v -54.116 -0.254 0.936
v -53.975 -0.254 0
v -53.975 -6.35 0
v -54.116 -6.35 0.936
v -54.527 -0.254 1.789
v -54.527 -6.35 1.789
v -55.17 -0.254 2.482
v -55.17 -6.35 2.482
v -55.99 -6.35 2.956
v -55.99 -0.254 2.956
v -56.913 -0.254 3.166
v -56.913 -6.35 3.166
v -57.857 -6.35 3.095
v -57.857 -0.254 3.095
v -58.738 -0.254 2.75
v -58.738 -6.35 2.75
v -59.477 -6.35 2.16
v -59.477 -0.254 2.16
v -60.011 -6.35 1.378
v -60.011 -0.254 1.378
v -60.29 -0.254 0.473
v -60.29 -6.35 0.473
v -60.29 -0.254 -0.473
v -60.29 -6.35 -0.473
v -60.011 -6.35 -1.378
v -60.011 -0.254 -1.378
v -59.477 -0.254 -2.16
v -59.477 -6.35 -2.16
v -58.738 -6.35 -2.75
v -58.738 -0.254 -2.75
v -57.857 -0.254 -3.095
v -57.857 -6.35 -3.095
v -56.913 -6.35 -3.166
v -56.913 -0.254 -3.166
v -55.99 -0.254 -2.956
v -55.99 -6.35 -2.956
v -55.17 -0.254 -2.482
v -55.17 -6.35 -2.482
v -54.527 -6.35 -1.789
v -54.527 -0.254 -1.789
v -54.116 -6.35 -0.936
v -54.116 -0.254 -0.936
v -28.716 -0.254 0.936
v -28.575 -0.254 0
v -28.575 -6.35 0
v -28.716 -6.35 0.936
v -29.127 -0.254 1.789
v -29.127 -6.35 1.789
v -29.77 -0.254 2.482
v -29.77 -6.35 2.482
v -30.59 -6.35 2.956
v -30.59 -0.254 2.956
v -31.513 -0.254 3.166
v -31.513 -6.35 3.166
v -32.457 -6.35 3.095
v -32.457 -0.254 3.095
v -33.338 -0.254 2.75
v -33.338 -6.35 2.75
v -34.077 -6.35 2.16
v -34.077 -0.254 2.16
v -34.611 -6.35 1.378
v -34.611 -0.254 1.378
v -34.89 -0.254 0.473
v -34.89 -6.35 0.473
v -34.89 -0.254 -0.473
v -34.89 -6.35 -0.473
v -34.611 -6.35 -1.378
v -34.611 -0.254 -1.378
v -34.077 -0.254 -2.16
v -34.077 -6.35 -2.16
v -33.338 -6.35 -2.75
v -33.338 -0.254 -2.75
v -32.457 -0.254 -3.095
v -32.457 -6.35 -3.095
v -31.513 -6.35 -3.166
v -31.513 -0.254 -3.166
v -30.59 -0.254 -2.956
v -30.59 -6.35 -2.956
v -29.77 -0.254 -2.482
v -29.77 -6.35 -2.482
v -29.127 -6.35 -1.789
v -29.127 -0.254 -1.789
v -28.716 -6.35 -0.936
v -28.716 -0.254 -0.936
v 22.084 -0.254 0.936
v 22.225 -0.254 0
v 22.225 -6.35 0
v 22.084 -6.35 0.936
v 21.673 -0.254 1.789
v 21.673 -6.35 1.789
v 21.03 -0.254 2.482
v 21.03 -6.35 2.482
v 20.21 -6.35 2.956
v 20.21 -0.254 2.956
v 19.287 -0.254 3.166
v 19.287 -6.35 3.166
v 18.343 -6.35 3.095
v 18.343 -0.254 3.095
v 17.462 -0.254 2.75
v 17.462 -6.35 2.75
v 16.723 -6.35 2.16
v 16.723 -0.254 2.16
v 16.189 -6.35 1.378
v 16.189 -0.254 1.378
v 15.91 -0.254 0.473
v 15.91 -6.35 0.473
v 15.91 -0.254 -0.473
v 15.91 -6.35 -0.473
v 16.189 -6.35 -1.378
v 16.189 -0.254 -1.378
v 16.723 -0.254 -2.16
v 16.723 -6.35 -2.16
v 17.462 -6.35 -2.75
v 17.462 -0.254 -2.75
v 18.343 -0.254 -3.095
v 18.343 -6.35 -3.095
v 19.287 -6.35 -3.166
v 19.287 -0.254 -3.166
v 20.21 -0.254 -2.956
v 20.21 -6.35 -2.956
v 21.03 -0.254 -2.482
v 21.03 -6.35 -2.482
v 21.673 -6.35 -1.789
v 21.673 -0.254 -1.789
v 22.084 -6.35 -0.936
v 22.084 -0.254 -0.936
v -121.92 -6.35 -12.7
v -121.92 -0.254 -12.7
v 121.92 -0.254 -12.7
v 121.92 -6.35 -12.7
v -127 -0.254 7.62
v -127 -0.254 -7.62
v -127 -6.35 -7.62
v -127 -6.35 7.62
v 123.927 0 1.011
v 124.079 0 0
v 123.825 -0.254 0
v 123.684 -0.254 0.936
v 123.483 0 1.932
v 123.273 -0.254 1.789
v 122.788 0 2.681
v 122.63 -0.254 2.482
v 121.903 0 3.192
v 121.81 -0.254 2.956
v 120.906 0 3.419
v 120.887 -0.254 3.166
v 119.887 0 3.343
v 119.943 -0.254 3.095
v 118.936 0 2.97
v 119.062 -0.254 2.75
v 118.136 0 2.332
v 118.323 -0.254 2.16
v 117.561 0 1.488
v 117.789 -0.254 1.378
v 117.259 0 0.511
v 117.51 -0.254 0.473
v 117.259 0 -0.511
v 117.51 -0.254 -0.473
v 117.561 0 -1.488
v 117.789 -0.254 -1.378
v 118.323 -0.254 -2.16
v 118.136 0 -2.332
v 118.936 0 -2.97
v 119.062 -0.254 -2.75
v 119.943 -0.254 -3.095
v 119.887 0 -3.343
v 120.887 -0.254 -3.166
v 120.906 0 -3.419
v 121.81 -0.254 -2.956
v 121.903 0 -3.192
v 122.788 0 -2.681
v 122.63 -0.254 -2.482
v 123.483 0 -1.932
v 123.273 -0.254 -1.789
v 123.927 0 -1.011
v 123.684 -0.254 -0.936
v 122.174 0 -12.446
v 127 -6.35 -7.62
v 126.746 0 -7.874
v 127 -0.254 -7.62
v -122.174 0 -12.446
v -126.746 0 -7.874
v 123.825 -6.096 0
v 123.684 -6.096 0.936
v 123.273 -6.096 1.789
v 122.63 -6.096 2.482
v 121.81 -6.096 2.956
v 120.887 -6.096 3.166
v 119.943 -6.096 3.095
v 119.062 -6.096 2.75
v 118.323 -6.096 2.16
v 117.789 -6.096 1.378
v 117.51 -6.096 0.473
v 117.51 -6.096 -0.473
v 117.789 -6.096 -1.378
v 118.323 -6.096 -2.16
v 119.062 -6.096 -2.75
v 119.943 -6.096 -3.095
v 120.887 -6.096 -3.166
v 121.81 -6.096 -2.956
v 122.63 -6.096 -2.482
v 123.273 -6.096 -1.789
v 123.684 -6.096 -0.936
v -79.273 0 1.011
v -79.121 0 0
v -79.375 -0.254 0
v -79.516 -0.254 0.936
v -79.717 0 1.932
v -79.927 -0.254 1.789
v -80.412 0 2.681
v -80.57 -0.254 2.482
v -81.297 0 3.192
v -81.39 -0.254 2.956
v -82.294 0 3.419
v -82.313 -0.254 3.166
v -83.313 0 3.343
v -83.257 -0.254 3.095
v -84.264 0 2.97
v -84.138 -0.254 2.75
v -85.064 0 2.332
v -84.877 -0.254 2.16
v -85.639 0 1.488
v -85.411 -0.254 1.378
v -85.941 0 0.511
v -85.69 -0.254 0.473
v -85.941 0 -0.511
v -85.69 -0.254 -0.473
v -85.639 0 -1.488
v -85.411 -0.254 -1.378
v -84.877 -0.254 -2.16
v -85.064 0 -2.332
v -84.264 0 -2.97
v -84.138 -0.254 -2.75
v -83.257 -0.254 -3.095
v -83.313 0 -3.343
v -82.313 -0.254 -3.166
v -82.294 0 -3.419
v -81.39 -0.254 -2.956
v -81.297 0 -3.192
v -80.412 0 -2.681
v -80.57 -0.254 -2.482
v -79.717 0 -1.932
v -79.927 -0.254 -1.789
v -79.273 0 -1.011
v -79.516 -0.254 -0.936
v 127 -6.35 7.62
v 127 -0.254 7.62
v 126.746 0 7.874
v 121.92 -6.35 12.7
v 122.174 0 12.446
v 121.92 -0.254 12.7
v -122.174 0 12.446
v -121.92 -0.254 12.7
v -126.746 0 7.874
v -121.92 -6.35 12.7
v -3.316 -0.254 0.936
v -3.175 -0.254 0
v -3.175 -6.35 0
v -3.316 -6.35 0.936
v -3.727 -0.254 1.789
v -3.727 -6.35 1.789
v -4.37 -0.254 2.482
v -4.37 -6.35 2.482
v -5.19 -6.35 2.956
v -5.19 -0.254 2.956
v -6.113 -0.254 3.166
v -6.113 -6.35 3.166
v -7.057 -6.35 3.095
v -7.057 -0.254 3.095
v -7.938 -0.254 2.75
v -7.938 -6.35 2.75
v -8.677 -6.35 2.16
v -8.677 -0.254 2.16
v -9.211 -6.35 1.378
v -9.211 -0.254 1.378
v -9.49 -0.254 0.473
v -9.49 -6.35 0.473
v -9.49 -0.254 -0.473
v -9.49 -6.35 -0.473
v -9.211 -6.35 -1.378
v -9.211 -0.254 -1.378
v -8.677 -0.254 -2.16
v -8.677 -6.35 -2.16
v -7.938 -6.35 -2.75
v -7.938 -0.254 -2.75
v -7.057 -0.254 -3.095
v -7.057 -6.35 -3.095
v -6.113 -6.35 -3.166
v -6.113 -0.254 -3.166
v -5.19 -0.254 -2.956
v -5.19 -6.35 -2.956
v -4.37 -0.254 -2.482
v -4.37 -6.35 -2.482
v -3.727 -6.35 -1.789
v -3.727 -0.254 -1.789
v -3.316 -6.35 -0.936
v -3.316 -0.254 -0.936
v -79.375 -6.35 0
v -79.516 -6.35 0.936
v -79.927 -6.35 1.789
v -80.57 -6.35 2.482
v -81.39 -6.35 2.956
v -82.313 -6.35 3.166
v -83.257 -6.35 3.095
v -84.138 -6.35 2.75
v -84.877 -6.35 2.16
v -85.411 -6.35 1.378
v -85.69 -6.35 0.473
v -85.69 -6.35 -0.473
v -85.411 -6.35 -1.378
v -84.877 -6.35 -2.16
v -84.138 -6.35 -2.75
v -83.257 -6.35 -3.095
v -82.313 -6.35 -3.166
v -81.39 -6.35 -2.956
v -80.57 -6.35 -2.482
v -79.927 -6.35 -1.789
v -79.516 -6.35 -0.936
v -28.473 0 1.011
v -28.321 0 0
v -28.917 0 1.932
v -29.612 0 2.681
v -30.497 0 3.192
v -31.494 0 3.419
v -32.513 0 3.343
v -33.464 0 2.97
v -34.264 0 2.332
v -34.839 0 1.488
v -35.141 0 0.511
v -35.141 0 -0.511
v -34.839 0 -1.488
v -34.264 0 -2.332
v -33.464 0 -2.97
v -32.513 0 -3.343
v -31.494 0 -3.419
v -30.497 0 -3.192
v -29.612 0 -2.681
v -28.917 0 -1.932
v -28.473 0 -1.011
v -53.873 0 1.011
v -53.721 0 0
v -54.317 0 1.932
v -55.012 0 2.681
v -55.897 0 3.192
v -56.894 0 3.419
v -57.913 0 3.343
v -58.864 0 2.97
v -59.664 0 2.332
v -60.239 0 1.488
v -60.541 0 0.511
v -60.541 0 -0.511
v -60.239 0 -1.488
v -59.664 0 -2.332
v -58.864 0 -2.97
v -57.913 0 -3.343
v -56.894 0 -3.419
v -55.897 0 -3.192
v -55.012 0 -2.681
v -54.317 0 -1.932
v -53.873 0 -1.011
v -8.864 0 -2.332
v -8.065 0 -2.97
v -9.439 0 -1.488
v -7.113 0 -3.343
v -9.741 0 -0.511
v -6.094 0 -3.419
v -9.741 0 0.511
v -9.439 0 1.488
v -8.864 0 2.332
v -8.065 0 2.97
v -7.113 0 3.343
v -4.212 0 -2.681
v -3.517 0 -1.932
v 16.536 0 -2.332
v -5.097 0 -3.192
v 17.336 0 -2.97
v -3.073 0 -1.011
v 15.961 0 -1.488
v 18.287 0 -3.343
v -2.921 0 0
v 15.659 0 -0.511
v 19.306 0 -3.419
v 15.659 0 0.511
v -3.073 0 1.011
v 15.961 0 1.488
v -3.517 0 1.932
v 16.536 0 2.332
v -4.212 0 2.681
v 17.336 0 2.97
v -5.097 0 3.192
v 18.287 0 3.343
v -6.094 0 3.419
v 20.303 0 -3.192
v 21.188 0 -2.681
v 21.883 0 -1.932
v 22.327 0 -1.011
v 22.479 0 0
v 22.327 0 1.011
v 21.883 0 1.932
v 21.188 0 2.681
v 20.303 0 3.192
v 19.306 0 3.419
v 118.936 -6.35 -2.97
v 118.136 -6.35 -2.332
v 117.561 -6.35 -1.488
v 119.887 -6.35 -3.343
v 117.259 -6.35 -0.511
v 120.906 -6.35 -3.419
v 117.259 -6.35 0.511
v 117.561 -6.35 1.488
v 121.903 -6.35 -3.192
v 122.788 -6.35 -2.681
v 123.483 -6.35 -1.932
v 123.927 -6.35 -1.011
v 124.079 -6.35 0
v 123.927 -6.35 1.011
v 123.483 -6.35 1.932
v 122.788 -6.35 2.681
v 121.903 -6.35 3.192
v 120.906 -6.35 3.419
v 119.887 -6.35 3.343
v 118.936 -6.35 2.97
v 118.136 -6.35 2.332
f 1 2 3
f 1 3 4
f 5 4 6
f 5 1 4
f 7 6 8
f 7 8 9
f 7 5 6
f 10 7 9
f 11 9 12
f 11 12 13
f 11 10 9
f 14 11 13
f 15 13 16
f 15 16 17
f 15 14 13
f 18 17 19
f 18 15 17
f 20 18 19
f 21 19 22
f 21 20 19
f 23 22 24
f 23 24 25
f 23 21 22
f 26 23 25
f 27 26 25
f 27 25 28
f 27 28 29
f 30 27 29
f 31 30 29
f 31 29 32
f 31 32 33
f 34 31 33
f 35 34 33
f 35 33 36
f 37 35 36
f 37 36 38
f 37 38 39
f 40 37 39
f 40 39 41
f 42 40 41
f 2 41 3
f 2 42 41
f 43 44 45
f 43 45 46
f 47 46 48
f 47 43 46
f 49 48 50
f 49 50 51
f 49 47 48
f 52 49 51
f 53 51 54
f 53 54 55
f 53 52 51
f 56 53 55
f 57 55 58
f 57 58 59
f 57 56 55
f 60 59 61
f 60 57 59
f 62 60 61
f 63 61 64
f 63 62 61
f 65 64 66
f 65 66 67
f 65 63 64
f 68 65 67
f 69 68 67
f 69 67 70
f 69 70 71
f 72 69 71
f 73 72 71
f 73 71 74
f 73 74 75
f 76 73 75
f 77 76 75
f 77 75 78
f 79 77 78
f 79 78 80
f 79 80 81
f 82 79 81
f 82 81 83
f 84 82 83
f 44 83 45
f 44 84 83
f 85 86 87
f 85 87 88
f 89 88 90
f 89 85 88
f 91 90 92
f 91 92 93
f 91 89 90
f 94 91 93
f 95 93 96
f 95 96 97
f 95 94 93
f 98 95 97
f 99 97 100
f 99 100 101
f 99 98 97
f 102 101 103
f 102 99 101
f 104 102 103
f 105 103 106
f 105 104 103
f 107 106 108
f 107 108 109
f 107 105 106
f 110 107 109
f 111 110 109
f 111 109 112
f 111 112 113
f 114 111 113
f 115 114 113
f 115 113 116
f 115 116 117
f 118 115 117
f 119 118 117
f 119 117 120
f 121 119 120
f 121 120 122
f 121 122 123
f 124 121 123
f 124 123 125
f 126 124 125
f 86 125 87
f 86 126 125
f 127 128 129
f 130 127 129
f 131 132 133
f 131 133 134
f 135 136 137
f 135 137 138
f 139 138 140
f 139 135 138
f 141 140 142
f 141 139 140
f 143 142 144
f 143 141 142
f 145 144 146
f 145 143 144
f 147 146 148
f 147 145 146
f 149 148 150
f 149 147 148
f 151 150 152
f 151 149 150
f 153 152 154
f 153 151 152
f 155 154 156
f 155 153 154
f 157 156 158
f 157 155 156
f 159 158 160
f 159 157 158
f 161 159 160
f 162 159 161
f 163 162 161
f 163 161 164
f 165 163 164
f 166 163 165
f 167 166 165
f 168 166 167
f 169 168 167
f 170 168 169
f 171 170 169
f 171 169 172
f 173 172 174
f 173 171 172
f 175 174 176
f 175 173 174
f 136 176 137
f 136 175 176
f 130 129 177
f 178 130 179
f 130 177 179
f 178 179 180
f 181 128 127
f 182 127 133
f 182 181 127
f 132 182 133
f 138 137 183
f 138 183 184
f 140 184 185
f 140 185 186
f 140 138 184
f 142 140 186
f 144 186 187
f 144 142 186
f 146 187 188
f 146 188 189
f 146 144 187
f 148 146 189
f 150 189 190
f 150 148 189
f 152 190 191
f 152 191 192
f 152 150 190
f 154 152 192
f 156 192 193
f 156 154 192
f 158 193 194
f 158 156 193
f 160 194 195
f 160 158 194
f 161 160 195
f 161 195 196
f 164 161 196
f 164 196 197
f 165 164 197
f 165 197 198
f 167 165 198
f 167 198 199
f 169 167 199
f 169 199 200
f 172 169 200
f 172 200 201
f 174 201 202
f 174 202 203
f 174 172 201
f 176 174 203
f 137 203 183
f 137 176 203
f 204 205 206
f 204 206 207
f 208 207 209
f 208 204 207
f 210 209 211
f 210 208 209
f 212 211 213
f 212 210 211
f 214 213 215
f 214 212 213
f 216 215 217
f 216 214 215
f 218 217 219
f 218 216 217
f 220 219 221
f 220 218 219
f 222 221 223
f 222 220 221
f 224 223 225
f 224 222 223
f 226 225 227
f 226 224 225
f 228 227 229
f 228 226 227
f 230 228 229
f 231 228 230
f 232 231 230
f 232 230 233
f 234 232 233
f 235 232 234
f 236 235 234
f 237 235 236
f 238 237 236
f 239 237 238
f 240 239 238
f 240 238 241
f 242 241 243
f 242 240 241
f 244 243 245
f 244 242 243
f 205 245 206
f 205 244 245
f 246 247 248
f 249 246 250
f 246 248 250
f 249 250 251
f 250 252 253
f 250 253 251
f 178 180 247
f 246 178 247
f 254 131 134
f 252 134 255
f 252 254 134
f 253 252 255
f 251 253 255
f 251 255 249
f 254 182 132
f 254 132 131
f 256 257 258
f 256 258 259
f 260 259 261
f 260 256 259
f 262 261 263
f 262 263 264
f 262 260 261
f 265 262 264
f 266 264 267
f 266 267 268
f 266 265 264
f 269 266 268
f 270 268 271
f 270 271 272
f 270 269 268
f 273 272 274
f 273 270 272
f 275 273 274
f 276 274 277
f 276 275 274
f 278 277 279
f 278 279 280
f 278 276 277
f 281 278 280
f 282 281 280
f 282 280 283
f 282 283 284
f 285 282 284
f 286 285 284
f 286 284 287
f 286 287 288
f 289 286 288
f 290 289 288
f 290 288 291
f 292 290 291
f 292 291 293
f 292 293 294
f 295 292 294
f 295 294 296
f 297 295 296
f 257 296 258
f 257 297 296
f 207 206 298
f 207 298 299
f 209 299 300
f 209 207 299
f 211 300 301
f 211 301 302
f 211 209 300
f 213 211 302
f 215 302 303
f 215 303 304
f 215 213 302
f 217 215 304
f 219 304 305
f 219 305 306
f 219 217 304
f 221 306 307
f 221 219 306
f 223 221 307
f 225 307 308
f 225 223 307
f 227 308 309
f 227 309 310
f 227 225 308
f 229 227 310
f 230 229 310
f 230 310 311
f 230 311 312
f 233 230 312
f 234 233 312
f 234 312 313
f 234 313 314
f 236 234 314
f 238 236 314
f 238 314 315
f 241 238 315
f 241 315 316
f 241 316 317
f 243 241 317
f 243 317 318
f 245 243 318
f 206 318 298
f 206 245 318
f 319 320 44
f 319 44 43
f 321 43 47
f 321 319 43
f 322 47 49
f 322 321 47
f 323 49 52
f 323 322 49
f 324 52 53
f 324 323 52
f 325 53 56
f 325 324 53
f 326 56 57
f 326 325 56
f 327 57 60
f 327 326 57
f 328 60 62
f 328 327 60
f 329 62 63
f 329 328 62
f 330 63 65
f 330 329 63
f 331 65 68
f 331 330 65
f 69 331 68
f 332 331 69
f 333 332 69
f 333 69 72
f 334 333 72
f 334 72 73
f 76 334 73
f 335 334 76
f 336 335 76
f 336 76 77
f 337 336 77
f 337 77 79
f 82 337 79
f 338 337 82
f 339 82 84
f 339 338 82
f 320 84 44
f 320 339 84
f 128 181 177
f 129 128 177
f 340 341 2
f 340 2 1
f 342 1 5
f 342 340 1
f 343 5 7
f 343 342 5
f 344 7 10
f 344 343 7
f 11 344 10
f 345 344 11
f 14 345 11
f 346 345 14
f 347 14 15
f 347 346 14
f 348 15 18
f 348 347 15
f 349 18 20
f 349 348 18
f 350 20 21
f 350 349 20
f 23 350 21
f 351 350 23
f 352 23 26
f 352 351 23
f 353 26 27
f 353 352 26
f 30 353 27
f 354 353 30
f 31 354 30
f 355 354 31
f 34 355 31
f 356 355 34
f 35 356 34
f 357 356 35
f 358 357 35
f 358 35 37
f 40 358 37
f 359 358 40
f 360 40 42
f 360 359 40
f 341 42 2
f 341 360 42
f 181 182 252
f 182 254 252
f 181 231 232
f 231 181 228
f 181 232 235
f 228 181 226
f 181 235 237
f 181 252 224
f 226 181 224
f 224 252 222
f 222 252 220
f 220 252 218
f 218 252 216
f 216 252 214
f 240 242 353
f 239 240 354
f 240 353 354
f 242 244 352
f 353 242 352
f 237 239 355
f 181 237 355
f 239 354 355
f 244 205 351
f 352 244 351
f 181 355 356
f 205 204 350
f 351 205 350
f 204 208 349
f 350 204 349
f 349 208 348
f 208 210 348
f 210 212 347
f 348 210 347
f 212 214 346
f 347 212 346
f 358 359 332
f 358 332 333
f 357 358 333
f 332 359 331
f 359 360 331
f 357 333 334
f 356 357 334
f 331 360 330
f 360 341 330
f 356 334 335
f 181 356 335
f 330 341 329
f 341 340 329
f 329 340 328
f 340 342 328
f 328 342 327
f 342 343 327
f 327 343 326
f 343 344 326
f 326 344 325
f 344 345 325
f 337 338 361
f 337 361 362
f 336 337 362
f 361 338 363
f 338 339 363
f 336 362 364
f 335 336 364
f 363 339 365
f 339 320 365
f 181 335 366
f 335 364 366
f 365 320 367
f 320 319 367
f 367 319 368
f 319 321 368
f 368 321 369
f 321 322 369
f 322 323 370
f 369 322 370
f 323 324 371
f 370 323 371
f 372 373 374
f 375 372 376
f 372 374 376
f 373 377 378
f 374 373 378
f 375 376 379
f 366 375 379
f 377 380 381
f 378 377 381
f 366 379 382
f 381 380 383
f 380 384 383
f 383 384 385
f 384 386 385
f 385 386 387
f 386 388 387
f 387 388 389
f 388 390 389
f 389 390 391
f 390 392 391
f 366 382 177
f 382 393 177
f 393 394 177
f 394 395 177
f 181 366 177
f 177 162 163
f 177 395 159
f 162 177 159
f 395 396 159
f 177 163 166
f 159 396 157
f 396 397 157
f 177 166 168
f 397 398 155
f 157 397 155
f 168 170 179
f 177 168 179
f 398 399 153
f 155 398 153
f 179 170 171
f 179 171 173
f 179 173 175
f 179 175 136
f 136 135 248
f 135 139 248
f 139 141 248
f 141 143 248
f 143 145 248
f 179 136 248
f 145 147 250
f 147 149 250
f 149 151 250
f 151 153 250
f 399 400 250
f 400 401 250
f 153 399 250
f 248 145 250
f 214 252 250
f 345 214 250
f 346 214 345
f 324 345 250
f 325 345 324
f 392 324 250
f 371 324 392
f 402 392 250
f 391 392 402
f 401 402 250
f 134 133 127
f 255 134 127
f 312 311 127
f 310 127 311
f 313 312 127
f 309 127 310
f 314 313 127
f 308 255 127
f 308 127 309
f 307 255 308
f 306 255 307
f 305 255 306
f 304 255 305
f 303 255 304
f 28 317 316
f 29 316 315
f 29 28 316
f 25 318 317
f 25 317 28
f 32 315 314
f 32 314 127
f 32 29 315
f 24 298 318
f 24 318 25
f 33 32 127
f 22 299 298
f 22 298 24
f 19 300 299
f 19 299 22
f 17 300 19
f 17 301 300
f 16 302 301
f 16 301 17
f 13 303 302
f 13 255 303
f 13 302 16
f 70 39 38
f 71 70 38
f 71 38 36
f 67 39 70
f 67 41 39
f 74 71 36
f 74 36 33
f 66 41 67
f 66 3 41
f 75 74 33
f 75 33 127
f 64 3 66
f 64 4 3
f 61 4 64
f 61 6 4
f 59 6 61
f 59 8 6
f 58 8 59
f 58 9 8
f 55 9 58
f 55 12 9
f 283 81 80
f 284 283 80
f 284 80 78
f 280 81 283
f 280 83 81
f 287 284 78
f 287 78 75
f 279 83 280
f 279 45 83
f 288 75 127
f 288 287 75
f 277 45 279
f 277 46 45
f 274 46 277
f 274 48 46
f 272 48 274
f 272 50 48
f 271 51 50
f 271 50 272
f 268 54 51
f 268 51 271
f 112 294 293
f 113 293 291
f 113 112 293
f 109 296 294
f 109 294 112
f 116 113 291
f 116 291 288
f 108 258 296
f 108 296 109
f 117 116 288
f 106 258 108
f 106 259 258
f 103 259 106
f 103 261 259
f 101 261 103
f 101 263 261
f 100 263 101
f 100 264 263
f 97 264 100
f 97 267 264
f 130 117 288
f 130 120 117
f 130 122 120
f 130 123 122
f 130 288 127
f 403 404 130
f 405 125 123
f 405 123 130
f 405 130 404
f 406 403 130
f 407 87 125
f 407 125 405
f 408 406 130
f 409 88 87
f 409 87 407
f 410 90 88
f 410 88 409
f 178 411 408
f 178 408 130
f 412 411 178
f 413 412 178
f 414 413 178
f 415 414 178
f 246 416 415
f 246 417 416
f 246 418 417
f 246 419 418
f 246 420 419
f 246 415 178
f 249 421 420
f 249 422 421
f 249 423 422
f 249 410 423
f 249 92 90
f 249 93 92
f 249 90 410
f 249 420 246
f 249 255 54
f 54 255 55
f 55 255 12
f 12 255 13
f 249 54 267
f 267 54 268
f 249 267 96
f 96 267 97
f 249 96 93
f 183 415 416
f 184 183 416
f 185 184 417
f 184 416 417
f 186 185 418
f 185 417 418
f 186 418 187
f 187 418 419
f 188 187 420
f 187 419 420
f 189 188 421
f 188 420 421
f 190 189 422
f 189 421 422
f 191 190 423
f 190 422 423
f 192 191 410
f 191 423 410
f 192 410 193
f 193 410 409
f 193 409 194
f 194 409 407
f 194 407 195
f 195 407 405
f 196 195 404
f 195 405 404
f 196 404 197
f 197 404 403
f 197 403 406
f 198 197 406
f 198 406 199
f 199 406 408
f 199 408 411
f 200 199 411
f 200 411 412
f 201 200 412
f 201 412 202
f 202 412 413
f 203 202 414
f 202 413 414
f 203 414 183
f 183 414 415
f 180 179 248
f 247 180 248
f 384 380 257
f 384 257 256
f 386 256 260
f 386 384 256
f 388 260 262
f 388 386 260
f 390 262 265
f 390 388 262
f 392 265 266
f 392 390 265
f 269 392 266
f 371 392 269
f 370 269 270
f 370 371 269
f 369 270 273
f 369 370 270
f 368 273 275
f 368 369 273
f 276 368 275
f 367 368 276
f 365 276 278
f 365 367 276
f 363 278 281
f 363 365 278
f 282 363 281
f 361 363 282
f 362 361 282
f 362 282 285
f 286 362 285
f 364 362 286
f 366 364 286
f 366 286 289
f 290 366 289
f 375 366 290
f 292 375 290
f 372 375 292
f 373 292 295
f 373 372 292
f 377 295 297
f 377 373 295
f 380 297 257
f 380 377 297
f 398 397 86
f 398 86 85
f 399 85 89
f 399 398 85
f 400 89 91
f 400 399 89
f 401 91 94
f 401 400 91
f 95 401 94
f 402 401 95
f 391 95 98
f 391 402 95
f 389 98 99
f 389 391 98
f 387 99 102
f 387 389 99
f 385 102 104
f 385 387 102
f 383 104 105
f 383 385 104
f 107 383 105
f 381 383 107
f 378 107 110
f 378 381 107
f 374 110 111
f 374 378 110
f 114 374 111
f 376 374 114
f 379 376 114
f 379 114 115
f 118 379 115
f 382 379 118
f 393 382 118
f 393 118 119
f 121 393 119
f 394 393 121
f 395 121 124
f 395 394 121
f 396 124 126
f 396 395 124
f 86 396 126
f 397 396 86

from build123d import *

# Parameters (mm, degrees)
F0_W        = 254
F0_H        = 25.4
F0_R        = 3.175
F1_DEPTH    = 6.35
F2_SIZE     = 0.254
F3_T1_DEPTH = 32.2242991577


# Not quite as in the source:
# - a fillet or chamfer that OpenCascade refuses, or shapes differently, is made with other operations: its cross-section is extruded or revolved along the edge and cut away or added
# - a feature names something its author has since deleted; it is built from what else it names


with BuildPart() as f1:
    # F0 (on Front) → F1 (new body)
    with BuildSketch(Plane.XZ):
        Rectangle(F0_W, F0_H)
        with Locations((-82.55, 0)):
            Circle(F0_R, mode=Mode.SUBTRACT)
        with Locations((-57.15, 0)):
            Circle(F0_R, mode=Mode.SUBTRACT)
        with Locations((-31.75, 0)):
            Circle(F0_R, mode=Mode.SUBTRACT)
        with Locations((-6.35, 0)):
            Circle(F0_R, mode=Mode.SUBTRACT)
        with Locations((19.05, 0)):
            Circle(F0_R, mode=Mode.SUBTRACT)
        with Locations((120.65, 0)):
            Circle(F0_R, mode=Mode.SUBTRACT)
    extrude(amount=F1_DEPTH)

    # F2
    f2_edges = [f1.edges().sort_by_distance(p)[0] for p in [
        (117.475, -6.35, 0),
        (117.475, 0, 0),
        (0, 0, -12.7),
        (127, 0, 0),
        (0, 0, 12.7),
        (-127, 0, 0),
        (-85.725, 0, 0),
        (-60.325, 0, 0),
        (-34.925, 0, 0),
        (-9.525, 0, 0),
        (15.875, 0, 0),
    ]]
    chamfer(f2_edges, length=F2_SIZE)

    # F3: chamfer of 5.08 on 4 edges, made by hand

    # F3_s2 → F3_t1 (cut)
    with BuildSketch(Plane.XZ.offset(-12.8101495789)):
        Polygon((-127, 7.62), (-121.92, 12.7), (-127, 12.7), align=None)
        Polygon((127, 7.62), (121.92, 12.7), (127, 12.7), align=None)
        Polygon((121.92, -12.7), (127, -7.62), (127, -12.7), align=None)
        Polygon((-121.92, -12.7), (-127, -7.62), (-127, -12.7), align=None)
    extrude(amount=F3_T1_DEPTH, mode=Mode.SUBTRACT)


solid = f1.part
